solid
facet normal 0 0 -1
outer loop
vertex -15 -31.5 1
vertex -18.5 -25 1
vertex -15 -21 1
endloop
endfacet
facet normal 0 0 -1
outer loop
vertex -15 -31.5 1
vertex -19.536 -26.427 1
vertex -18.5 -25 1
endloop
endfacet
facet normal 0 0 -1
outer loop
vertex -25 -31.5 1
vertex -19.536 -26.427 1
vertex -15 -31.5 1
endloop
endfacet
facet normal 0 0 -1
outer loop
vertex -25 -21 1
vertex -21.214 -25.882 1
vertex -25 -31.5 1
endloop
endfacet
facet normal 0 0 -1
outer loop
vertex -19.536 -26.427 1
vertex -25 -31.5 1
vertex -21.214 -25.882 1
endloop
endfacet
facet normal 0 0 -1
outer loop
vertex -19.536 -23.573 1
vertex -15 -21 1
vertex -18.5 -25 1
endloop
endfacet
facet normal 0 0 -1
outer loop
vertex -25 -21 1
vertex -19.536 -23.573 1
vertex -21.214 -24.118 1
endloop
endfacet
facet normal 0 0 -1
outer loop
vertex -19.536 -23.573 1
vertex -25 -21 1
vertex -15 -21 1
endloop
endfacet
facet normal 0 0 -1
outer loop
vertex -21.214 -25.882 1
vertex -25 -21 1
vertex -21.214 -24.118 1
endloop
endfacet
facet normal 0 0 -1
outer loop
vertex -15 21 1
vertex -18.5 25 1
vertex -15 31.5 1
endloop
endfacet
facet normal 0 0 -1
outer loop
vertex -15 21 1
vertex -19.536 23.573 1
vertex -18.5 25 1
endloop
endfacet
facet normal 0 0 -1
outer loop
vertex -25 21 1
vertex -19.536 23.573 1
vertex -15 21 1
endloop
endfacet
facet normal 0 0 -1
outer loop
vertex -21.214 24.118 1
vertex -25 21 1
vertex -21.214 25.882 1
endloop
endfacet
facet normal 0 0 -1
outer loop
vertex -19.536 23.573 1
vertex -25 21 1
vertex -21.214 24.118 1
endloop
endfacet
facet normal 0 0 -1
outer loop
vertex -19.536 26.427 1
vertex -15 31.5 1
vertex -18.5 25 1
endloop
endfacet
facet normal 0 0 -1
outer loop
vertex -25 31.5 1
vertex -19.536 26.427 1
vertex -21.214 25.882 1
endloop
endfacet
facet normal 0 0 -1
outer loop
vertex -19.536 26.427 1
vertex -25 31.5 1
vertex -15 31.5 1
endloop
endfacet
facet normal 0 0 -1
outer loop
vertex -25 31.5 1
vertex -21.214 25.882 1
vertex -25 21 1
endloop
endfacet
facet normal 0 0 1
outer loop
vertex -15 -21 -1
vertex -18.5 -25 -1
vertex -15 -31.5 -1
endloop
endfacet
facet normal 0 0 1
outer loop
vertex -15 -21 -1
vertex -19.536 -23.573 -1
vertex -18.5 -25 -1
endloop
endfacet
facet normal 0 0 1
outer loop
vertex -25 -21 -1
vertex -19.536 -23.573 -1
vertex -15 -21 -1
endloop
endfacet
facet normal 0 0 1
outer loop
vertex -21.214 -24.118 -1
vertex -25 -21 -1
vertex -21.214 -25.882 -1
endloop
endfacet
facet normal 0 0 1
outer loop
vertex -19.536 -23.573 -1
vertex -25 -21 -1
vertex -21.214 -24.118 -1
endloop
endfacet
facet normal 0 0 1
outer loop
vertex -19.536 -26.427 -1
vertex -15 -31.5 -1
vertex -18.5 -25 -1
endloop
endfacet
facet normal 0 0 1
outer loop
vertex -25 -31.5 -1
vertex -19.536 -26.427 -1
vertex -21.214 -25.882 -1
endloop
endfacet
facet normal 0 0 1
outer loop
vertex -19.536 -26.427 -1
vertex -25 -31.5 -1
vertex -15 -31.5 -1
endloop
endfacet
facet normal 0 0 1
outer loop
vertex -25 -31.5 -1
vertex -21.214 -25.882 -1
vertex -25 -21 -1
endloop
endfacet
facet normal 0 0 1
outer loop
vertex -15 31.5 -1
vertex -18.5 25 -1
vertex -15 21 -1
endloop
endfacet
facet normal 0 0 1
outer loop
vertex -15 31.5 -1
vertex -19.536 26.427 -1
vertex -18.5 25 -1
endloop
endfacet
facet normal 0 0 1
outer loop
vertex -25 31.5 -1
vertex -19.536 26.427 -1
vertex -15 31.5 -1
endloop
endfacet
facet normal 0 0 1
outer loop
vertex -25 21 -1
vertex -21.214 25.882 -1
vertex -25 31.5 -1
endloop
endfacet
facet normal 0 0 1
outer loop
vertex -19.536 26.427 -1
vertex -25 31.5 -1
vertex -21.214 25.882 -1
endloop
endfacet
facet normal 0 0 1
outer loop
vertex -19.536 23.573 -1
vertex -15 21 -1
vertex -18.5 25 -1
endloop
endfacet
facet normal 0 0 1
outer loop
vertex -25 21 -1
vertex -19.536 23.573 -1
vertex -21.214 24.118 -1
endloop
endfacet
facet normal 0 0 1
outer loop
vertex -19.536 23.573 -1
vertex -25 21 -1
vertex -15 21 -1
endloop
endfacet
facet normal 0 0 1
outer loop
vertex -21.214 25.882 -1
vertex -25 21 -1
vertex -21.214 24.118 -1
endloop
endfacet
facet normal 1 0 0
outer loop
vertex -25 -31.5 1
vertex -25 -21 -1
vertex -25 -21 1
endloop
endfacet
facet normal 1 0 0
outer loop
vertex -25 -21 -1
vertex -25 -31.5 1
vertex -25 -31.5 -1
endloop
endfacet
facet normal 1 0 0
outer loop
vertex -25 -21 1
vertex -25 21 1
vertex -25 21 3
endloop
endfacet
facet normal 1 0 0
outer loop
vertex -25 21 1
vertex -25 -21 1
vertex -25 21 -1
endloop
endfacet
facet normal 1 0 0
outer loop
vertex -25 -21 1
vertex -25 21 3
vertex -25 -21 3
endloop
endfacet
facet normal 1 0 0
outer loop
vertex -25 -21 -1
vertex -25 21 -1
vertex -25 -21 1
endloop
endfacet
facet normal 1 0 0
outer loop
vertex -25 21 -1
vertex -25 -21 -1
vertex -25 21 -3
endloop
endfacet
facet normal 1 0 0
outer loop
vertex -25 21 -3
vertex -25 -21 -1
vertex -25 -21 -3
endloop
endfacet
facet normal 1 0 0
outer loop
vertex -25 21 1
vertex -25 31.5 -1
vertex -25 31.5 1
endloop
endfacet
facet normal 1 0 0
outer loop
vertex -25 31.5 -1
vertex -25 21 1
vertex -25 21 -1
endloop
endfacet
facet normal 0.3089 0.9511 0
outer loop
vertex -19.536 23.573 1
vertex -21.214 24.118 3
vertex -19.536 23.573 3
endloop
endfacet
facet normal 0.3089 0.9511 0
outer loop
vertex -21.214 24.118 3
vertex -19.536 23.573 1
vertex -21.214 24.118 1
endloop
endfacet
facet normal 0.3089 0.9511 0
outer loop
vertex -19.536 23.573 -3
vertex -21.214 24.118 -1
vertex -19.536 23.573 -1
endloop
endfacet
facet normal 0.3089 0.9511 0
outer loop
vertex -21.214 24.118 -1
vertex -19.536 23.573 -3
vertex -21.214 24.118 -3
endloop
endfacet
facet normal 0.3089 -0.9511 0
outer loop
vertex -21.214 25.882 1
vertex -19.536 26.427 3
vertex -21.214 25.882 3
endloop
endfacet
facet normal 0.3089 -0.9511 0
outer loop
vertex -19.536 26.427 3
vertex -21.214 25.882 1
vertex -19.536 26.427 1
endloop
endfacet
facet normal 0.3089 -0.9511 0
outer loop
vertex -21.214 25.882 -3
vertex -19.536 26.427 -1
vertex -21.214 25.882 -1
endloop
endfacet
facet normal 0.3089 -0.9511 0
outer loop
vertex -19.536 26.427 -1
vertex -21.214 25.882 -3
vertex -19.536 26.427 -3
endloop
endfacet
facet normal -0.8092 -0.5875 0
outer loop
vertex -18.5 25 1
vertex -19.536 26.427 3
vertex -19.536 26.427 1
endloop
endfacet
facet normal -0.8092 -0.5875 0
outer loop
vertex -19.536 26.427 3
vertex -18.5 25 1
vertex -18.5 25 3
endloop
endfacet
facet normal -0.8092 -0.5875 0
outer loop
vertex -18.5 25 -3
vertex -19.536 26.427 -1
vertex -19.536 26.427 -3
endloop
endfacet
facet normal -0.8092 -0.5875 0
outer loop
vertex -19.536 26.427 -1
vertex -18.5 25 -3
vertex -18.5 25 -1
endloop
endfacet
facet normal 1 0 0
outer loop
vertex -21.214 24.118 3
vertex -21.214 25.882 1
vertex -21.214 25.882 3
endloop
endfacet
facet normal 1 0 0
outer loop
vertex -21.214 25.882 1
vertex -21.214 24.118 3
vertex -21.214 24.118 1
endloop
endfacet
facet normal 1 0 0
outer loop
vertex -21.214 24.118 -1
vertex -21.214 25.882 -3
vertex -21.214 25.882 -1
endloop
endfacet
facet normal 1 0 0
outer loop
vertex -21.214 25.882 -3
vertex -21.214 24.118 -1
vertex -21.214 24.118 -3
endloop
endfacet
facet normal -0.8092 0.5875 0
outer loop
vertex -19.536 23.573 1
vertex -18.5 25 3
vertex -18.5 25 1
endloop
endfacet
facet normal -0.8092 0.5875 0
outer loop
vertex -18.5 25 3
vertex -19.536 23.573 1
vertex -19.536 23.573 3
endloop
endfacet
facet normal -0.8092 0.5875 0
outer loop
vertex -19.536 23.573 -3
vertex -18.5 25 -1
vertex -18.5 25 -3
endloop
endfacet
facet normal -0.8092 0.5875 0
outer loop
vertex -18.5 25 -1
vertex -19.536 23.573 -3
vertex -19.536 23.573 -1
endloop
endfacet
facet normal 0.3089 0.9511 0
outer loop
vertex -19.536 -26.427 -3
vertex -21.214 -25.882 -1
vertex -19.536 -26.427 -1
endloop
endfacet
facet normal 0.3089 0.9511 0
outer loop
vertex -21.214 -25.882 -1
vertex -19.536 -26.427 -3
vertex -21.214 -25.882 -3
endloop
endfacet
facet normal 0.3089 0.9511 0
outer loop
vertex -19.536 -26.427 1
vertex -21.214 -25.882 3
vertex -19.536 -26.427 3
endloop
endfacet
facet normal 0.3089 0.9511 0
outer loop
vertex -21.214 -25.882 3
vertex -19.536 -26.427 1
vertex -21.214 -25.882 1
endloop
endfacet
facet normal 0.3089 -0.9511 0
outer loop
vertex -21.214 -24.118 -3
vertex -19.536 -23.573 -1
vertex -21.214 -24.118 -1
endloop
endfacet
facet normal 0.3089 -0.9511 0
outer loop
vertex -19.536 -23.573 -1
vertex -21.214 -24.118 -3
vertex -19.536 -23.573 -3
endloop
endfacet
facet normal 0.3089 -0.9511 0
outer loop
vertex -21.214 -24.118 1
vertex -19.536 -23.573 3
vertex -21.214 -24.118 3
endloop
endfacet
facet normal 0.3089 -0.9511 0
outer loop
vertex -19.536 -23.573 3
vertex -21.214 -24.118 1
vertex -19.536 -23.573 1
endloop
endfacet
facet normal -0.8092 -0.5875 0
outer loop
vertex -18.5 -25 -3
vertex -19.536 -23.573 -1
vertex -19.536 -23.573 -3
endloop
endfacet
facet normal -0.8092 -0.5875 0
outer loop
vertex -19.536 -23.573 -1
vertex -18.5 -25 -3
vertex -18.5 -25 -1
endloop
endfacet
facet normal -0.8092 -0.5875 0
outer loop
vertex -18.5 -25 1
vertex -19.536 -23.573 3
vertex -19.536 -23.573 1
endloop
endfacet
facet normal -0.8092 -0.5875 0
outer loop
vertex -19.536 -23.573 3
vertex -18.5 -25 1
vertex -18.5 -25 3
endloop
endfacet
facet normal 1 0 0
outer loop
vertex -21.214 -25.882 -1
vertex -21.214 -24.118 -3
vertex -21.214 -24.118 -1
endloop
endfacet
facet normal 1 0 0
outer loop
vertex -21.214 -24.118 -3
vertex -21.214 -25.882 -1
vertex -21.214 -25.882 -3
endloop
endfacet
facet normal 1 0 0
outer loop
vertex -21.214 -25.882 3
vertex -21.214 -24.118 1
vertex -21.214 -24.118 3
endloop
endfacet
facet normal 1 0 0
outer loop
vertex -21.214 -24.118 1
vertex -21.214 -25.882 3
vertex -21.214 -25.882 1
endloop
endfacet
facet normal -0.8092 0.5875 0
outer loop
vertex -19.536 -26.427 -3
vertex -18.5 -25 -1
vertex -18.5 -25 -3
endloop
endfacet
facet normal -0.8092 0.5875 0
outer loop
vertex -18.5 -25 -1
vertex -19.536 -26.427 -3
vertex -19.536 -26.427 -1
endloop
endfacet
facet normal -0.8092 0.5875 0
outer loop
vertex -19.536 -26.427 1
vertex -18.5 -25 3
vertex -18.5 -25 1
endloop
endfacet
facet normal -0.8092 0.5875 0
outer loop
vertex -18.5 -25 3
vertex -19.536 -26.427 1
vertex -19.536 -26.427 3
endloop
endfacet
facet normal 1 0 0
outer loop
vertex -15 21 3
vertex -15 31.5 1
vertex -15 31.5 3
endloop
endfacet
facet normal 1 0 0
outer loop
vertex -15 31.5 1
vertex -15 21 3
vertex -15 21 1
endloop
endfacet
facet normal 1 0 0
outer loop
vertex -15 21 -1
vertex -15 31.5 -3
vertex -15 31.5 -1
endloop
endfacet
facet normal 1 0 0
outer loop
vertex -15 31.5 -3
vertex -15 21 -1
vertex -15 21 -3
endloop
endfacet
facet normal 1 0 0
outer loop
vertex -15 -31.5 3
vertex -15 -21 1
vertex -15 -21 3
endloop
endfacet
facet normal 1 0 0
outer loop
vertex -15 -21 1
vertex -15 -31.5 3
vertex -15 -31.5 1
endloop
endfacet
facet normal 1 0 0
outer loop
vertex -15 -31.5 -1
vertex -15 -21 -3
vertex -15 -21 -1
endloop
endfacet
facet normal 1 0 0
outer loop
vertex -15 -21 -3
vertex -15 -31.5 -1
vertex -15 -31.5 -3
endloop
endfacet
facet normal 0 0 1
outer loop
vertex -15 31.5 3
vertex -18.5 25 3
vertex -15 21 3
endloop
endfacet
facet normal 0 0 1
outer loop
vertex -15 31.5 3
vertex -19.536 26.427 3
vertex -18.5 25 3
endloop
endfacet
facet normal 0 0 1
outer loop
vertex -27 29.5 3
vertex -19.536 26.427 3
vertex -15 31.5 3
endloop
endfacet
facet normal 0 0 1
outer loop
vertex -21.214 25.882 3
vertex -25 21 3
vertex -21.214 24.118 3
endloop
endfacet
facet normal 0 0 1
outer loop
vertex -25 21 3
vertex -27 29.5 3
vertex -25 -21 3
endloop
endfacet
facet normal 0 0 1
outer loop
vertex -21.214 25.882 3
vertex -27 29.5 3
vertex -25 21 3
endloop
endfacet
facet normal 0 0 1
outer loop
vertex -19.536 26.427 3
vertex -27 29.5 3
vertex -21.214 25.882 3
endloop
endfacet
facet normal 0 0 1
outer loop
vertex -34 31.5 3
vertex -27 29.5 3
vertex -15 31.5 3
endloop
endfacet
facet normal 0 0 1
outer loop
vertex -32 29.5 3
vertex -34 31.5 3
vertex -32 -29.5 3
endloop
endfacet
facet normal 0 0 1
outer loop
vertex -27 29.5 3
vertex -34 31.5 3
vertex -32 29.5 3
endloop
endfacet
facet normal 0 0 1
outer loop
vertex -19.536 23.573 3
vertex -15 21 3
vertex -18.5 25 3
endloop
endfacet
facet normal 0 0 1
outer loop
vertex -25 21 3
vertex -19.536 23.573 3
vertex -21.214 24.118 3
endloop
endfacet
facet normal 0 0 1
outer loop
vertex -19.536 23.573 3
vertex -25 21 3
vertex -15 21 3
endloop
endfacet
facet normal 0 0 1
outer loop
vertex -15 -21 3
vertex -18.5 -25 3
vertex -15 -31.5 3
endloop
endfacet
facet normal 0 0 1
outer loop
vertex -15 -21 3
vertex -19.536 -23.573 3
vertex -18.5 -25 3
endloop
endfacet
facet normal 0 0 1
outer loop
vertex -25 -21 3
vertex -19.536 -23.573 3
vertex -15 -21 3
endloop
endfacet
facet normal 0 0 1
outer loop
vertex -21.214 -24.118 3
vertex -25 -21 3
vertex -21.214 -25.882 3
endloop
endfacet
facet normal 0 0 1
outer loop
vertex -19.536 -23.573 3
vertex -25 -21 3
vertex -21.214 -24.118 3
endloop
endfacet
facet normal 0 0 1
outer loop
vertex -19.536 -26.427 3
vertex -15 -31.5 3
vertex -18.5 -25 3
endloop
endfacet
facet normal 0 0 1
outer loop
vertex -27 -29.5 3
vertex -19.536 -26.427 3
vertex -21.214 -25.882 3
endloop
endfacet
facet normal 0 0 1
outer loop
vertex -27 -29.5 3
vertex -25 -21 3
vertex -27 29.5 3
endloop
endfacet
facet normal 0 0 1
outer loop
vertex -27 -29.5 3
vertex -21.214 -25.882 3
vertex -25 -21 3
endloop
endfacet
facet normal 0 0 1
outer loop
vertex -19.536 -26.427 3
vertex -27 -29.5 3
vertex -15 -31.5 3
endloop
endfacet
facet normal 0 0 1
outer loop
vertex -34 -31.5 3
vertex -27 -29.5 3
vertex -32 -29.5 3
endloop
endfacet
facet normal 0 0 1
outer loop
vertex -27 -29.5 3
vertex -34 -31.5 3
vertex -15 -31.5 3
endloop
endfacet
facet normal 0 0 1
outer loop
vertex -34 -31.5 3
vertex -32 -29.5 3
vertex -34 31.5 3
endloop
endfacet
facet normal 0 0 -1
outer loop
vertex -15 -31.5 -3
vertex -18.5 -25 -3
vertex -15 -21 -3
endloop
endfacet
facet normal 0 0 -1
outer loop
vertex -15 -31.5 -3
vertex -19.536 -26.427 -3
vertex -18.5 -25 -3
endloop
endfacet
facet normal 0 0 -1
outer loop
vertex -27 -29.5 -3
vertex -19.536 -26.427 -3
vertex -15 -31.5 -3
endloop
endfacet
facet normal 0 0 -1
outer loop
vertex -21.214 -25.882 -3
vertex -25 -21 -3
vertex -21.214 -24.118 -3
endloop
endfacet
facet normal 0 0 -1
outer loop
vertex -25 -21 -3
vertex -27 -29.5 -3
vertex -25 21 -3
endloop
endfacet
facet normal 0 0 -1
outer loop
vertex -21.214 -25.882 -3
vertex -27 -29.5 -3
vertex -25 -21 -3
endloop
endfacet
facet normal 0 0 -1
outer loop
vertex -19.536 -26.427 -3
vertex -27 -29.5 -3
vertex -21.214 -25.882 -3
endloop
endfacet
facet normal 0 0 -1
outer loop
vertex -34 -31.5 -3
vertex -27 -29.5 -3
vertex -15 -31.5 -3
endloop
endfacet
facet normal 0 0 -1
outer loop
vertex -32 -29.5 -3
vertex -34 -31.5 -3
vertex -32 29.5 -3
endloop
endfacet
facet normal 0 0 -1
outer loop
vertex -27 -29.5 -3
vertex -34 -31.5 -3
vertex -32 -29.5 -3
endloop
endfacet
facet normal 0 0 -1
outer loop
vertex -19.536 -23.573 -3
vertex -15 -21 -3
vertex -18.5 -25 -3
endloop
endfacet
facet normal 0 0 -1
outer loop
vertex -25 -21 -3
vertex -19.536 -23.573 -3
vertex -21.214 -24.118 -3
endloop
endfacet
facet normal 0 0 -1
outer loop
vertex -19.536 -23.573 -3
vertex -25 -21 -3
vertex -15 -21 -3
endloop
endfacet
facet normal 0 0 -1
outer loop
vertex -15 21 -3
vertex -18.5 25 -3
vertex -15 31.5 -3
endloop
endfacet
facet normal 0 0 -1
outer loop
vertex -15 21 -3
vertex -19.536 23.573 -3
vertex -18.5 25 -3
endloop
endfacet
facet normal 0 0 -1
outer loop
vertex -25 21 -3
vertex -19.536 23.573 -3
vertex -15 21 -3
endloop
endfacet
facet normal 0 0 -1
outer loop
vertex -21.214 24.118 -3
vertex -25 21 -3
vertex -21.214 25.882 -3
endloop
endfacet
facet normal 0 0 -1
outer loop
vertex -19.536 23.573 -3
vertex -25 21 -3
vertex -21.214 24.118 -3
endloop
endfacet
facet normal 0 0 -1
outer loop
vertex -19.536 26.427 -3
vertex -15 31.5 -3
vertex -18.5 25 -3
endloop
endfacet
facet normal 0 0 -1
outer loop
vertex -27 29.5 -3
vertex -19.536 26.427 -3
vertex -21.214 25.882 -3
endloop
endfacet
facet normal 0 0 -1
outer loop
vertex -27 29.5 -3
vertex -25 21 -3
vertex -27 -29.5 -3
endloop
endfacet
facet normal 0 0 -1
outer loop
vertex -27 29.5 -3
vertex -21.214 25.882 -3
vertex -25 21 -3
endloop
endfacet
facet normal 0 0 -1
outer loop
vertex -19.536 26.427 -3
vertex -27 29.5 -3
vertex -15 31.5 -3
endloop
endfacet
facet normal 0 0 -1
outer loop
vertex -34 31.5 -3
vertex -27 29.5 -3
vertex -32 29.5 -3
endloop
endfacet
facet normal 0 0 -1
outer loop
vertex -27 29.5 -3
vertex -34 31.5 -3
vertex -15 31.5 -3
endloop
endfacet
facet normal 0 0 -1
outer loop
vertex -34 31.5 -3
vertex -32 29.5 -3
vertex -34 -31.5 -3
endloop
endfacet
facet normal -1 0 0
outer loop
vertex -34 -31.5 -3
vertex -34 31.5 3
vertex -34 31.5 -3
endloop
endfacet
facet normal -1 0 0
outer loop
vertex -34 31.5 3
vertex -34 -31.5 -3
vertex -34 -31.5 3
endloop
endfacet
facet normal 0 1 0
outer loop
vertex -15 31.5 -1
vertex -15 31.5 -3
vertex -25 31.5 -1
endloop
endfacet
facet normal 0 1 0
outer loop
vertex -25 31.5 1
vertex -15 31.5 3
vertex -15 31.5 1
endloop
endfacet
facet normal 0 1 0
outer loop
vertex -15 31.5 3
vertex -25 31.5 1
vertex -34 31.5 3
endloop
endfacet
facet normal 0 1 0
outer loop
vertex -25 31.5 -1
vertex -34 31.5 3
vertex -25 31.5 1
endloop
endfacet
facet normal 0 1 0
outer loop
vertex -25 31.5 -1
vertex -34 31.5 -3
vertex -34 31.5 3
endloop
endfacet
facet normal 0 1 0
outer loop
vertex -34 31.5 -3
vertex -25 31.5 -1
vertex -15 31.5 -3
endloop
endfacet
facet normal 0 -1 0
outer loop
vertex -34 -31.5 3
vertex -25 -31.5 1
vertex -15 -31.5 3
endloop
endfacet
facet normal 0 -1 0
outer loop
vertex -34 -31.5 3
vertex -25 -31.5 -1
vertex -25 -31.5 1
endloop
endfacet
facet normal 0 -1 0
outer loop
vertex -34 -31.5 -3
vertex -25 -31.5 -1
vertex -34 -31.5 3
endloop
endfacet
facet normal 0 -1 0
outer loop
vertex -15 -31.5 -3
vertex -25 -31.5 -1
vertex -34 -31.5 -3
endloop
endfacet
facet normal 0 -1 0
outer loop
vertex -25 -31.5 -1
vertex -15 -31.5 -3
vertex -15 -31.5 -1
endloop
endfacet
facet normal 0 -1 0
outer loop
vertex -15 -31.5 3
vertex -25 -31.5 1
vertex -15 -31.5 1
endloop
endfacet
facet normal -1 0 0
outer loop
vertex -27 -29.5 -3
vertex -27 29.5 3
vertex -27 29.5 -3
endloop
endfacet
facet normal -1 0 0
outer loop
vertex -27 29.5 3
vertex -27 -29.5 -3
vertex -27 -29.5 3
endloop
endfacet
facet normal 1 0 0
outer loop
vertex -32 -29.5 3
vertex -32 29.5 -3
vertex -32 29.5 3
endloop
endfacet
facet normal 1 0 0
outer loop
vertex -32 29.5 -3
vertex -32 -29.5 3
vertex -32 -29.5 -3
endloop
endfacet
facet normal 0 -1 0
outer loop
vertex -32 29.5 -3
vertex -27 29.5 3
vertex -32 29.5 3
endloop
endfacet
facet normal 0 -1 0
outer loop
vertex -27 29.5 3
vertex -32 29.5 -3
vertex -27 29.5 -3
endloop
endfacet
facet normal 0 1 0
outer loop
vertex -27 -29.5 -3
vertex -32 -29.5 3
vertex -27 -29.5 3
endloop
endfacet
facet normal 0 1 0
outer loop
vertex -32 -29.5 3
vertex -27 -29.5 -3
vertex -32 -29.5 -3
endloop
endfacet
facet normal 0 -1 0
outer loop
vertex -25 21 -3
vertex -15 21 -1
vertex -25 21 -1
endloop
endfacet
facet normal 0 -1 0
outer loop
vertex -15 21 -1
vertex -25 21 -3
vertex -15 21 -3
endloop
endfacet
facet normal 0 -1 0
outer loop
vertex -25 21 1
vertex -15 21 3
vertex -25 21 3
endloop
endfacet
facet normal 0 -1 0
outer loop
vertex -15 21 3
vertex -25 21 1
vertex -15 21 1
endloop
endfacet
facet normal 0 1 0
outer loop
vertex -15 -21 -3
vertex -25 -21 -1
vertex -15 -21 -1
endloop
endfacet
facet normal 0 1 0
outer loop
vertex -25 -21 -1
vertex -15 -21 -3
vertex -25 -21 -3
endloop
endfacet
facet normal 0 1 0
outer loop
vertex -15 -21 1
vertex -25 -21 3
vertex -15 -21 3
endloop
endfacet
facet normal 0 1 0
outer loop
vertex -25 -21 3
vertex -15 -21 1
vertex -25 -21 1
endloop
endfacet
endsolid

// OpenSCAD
// Dimensions

// PCB (to get the fit right)
PCB_WIDTH = 50;
PCB_LENGTH = 70;
PCB_HEIGHT = 2;

PCB_HOLES_DIAM = 3;
PCB_HOLES_X = 5;
PCB_HOLES_Y = 10;

// Holder
WALLS_WIDTH = 2;

// Gears
GEARS_WIDTH = 5;
FIRST_AXIS_X = 10;

module PCB()
{
  cube([PCB_WIDTH, PCB_LENGTH, PCB_HEIGHT], center=true);
  translate([PCB_WIDTH/2-PCB_HOLES_X, PCB_LENGTH/2-PCB_HOLES_Y, 0]) {
    cylinder(100, d=PCB_HOLES_DIAM, center=true);
  }
  translate([-(PCB_WIDTH/2-PCB_HOLES_X), PCB_LENGTH/2-PCB_HOLES_Y, 0]) {
    cylinder(100, d=PCB_HOLES_DIAM, center=true);
  }
  translate([PCB_WIDTH/2-PCB_HOLES_X, -(PCB_LENGTH/2-PCB_HOLES_Y), 0]) {
    cylinder(100, d=PCB_HOLES_DIAM, center=true);
  }
  translate([-(PCB_WIDTH/2-PCB_HOLES_X), -(PCB_LENGTH/2-PCB_HOLES_Y), 0]) {
    cylinder(100, d=PCB_HOLES_DIAM, center=true);
  }
}

module GEAR_HOLDER()
{
  width = PCB_HOLES_Y + 2 * WALLS_WIDTH;
  length = PCB_LENGTH - 2*PCB_HOLES_X + PCB_HOLES_DIAM;
  height = PCB_HEIGHT + 2*WALLS_WIDTH;

  full_width = width + GEARS_WIDTH;

  length_cut = length - 2*PCB_HOLES_X - 2 * PCB_HOLES_DIAM - 5;
  width_cut = width - WALLS_WIDTH + 5;

  difference() {
  translate([-PCB_WIDTH/2-2*WALLS_WIDTH-GEARS_WIDTH, -length/2, -height/2])
  {
    cube([full_width, length, height]);
  }

  translate([-PCB_WIDTH/2-WALLS_WIDTH-GEARS_WIDTH, -length/2+WALLS_WIDTH, -height/2-5])
  {
    cube([GEARS_WIDTH, length-2*WALLS_WIDTH, height+10]);
  }

  translate([-PCB_WIDTH/2, -length_cut/2, -(height+4)/2])
  {
    cube([width_cut, length_cut, height+4]);
  }

  translate([-PCB_WIDTH/2, -length/2-FIRST_AXIS_X, 0])
  {
    #rotate([90, 0, 90]) cylinder(10, d=2, center=true);
  }
  PCB();
  }
}

//PCB();
GEAR_HOLDER();
